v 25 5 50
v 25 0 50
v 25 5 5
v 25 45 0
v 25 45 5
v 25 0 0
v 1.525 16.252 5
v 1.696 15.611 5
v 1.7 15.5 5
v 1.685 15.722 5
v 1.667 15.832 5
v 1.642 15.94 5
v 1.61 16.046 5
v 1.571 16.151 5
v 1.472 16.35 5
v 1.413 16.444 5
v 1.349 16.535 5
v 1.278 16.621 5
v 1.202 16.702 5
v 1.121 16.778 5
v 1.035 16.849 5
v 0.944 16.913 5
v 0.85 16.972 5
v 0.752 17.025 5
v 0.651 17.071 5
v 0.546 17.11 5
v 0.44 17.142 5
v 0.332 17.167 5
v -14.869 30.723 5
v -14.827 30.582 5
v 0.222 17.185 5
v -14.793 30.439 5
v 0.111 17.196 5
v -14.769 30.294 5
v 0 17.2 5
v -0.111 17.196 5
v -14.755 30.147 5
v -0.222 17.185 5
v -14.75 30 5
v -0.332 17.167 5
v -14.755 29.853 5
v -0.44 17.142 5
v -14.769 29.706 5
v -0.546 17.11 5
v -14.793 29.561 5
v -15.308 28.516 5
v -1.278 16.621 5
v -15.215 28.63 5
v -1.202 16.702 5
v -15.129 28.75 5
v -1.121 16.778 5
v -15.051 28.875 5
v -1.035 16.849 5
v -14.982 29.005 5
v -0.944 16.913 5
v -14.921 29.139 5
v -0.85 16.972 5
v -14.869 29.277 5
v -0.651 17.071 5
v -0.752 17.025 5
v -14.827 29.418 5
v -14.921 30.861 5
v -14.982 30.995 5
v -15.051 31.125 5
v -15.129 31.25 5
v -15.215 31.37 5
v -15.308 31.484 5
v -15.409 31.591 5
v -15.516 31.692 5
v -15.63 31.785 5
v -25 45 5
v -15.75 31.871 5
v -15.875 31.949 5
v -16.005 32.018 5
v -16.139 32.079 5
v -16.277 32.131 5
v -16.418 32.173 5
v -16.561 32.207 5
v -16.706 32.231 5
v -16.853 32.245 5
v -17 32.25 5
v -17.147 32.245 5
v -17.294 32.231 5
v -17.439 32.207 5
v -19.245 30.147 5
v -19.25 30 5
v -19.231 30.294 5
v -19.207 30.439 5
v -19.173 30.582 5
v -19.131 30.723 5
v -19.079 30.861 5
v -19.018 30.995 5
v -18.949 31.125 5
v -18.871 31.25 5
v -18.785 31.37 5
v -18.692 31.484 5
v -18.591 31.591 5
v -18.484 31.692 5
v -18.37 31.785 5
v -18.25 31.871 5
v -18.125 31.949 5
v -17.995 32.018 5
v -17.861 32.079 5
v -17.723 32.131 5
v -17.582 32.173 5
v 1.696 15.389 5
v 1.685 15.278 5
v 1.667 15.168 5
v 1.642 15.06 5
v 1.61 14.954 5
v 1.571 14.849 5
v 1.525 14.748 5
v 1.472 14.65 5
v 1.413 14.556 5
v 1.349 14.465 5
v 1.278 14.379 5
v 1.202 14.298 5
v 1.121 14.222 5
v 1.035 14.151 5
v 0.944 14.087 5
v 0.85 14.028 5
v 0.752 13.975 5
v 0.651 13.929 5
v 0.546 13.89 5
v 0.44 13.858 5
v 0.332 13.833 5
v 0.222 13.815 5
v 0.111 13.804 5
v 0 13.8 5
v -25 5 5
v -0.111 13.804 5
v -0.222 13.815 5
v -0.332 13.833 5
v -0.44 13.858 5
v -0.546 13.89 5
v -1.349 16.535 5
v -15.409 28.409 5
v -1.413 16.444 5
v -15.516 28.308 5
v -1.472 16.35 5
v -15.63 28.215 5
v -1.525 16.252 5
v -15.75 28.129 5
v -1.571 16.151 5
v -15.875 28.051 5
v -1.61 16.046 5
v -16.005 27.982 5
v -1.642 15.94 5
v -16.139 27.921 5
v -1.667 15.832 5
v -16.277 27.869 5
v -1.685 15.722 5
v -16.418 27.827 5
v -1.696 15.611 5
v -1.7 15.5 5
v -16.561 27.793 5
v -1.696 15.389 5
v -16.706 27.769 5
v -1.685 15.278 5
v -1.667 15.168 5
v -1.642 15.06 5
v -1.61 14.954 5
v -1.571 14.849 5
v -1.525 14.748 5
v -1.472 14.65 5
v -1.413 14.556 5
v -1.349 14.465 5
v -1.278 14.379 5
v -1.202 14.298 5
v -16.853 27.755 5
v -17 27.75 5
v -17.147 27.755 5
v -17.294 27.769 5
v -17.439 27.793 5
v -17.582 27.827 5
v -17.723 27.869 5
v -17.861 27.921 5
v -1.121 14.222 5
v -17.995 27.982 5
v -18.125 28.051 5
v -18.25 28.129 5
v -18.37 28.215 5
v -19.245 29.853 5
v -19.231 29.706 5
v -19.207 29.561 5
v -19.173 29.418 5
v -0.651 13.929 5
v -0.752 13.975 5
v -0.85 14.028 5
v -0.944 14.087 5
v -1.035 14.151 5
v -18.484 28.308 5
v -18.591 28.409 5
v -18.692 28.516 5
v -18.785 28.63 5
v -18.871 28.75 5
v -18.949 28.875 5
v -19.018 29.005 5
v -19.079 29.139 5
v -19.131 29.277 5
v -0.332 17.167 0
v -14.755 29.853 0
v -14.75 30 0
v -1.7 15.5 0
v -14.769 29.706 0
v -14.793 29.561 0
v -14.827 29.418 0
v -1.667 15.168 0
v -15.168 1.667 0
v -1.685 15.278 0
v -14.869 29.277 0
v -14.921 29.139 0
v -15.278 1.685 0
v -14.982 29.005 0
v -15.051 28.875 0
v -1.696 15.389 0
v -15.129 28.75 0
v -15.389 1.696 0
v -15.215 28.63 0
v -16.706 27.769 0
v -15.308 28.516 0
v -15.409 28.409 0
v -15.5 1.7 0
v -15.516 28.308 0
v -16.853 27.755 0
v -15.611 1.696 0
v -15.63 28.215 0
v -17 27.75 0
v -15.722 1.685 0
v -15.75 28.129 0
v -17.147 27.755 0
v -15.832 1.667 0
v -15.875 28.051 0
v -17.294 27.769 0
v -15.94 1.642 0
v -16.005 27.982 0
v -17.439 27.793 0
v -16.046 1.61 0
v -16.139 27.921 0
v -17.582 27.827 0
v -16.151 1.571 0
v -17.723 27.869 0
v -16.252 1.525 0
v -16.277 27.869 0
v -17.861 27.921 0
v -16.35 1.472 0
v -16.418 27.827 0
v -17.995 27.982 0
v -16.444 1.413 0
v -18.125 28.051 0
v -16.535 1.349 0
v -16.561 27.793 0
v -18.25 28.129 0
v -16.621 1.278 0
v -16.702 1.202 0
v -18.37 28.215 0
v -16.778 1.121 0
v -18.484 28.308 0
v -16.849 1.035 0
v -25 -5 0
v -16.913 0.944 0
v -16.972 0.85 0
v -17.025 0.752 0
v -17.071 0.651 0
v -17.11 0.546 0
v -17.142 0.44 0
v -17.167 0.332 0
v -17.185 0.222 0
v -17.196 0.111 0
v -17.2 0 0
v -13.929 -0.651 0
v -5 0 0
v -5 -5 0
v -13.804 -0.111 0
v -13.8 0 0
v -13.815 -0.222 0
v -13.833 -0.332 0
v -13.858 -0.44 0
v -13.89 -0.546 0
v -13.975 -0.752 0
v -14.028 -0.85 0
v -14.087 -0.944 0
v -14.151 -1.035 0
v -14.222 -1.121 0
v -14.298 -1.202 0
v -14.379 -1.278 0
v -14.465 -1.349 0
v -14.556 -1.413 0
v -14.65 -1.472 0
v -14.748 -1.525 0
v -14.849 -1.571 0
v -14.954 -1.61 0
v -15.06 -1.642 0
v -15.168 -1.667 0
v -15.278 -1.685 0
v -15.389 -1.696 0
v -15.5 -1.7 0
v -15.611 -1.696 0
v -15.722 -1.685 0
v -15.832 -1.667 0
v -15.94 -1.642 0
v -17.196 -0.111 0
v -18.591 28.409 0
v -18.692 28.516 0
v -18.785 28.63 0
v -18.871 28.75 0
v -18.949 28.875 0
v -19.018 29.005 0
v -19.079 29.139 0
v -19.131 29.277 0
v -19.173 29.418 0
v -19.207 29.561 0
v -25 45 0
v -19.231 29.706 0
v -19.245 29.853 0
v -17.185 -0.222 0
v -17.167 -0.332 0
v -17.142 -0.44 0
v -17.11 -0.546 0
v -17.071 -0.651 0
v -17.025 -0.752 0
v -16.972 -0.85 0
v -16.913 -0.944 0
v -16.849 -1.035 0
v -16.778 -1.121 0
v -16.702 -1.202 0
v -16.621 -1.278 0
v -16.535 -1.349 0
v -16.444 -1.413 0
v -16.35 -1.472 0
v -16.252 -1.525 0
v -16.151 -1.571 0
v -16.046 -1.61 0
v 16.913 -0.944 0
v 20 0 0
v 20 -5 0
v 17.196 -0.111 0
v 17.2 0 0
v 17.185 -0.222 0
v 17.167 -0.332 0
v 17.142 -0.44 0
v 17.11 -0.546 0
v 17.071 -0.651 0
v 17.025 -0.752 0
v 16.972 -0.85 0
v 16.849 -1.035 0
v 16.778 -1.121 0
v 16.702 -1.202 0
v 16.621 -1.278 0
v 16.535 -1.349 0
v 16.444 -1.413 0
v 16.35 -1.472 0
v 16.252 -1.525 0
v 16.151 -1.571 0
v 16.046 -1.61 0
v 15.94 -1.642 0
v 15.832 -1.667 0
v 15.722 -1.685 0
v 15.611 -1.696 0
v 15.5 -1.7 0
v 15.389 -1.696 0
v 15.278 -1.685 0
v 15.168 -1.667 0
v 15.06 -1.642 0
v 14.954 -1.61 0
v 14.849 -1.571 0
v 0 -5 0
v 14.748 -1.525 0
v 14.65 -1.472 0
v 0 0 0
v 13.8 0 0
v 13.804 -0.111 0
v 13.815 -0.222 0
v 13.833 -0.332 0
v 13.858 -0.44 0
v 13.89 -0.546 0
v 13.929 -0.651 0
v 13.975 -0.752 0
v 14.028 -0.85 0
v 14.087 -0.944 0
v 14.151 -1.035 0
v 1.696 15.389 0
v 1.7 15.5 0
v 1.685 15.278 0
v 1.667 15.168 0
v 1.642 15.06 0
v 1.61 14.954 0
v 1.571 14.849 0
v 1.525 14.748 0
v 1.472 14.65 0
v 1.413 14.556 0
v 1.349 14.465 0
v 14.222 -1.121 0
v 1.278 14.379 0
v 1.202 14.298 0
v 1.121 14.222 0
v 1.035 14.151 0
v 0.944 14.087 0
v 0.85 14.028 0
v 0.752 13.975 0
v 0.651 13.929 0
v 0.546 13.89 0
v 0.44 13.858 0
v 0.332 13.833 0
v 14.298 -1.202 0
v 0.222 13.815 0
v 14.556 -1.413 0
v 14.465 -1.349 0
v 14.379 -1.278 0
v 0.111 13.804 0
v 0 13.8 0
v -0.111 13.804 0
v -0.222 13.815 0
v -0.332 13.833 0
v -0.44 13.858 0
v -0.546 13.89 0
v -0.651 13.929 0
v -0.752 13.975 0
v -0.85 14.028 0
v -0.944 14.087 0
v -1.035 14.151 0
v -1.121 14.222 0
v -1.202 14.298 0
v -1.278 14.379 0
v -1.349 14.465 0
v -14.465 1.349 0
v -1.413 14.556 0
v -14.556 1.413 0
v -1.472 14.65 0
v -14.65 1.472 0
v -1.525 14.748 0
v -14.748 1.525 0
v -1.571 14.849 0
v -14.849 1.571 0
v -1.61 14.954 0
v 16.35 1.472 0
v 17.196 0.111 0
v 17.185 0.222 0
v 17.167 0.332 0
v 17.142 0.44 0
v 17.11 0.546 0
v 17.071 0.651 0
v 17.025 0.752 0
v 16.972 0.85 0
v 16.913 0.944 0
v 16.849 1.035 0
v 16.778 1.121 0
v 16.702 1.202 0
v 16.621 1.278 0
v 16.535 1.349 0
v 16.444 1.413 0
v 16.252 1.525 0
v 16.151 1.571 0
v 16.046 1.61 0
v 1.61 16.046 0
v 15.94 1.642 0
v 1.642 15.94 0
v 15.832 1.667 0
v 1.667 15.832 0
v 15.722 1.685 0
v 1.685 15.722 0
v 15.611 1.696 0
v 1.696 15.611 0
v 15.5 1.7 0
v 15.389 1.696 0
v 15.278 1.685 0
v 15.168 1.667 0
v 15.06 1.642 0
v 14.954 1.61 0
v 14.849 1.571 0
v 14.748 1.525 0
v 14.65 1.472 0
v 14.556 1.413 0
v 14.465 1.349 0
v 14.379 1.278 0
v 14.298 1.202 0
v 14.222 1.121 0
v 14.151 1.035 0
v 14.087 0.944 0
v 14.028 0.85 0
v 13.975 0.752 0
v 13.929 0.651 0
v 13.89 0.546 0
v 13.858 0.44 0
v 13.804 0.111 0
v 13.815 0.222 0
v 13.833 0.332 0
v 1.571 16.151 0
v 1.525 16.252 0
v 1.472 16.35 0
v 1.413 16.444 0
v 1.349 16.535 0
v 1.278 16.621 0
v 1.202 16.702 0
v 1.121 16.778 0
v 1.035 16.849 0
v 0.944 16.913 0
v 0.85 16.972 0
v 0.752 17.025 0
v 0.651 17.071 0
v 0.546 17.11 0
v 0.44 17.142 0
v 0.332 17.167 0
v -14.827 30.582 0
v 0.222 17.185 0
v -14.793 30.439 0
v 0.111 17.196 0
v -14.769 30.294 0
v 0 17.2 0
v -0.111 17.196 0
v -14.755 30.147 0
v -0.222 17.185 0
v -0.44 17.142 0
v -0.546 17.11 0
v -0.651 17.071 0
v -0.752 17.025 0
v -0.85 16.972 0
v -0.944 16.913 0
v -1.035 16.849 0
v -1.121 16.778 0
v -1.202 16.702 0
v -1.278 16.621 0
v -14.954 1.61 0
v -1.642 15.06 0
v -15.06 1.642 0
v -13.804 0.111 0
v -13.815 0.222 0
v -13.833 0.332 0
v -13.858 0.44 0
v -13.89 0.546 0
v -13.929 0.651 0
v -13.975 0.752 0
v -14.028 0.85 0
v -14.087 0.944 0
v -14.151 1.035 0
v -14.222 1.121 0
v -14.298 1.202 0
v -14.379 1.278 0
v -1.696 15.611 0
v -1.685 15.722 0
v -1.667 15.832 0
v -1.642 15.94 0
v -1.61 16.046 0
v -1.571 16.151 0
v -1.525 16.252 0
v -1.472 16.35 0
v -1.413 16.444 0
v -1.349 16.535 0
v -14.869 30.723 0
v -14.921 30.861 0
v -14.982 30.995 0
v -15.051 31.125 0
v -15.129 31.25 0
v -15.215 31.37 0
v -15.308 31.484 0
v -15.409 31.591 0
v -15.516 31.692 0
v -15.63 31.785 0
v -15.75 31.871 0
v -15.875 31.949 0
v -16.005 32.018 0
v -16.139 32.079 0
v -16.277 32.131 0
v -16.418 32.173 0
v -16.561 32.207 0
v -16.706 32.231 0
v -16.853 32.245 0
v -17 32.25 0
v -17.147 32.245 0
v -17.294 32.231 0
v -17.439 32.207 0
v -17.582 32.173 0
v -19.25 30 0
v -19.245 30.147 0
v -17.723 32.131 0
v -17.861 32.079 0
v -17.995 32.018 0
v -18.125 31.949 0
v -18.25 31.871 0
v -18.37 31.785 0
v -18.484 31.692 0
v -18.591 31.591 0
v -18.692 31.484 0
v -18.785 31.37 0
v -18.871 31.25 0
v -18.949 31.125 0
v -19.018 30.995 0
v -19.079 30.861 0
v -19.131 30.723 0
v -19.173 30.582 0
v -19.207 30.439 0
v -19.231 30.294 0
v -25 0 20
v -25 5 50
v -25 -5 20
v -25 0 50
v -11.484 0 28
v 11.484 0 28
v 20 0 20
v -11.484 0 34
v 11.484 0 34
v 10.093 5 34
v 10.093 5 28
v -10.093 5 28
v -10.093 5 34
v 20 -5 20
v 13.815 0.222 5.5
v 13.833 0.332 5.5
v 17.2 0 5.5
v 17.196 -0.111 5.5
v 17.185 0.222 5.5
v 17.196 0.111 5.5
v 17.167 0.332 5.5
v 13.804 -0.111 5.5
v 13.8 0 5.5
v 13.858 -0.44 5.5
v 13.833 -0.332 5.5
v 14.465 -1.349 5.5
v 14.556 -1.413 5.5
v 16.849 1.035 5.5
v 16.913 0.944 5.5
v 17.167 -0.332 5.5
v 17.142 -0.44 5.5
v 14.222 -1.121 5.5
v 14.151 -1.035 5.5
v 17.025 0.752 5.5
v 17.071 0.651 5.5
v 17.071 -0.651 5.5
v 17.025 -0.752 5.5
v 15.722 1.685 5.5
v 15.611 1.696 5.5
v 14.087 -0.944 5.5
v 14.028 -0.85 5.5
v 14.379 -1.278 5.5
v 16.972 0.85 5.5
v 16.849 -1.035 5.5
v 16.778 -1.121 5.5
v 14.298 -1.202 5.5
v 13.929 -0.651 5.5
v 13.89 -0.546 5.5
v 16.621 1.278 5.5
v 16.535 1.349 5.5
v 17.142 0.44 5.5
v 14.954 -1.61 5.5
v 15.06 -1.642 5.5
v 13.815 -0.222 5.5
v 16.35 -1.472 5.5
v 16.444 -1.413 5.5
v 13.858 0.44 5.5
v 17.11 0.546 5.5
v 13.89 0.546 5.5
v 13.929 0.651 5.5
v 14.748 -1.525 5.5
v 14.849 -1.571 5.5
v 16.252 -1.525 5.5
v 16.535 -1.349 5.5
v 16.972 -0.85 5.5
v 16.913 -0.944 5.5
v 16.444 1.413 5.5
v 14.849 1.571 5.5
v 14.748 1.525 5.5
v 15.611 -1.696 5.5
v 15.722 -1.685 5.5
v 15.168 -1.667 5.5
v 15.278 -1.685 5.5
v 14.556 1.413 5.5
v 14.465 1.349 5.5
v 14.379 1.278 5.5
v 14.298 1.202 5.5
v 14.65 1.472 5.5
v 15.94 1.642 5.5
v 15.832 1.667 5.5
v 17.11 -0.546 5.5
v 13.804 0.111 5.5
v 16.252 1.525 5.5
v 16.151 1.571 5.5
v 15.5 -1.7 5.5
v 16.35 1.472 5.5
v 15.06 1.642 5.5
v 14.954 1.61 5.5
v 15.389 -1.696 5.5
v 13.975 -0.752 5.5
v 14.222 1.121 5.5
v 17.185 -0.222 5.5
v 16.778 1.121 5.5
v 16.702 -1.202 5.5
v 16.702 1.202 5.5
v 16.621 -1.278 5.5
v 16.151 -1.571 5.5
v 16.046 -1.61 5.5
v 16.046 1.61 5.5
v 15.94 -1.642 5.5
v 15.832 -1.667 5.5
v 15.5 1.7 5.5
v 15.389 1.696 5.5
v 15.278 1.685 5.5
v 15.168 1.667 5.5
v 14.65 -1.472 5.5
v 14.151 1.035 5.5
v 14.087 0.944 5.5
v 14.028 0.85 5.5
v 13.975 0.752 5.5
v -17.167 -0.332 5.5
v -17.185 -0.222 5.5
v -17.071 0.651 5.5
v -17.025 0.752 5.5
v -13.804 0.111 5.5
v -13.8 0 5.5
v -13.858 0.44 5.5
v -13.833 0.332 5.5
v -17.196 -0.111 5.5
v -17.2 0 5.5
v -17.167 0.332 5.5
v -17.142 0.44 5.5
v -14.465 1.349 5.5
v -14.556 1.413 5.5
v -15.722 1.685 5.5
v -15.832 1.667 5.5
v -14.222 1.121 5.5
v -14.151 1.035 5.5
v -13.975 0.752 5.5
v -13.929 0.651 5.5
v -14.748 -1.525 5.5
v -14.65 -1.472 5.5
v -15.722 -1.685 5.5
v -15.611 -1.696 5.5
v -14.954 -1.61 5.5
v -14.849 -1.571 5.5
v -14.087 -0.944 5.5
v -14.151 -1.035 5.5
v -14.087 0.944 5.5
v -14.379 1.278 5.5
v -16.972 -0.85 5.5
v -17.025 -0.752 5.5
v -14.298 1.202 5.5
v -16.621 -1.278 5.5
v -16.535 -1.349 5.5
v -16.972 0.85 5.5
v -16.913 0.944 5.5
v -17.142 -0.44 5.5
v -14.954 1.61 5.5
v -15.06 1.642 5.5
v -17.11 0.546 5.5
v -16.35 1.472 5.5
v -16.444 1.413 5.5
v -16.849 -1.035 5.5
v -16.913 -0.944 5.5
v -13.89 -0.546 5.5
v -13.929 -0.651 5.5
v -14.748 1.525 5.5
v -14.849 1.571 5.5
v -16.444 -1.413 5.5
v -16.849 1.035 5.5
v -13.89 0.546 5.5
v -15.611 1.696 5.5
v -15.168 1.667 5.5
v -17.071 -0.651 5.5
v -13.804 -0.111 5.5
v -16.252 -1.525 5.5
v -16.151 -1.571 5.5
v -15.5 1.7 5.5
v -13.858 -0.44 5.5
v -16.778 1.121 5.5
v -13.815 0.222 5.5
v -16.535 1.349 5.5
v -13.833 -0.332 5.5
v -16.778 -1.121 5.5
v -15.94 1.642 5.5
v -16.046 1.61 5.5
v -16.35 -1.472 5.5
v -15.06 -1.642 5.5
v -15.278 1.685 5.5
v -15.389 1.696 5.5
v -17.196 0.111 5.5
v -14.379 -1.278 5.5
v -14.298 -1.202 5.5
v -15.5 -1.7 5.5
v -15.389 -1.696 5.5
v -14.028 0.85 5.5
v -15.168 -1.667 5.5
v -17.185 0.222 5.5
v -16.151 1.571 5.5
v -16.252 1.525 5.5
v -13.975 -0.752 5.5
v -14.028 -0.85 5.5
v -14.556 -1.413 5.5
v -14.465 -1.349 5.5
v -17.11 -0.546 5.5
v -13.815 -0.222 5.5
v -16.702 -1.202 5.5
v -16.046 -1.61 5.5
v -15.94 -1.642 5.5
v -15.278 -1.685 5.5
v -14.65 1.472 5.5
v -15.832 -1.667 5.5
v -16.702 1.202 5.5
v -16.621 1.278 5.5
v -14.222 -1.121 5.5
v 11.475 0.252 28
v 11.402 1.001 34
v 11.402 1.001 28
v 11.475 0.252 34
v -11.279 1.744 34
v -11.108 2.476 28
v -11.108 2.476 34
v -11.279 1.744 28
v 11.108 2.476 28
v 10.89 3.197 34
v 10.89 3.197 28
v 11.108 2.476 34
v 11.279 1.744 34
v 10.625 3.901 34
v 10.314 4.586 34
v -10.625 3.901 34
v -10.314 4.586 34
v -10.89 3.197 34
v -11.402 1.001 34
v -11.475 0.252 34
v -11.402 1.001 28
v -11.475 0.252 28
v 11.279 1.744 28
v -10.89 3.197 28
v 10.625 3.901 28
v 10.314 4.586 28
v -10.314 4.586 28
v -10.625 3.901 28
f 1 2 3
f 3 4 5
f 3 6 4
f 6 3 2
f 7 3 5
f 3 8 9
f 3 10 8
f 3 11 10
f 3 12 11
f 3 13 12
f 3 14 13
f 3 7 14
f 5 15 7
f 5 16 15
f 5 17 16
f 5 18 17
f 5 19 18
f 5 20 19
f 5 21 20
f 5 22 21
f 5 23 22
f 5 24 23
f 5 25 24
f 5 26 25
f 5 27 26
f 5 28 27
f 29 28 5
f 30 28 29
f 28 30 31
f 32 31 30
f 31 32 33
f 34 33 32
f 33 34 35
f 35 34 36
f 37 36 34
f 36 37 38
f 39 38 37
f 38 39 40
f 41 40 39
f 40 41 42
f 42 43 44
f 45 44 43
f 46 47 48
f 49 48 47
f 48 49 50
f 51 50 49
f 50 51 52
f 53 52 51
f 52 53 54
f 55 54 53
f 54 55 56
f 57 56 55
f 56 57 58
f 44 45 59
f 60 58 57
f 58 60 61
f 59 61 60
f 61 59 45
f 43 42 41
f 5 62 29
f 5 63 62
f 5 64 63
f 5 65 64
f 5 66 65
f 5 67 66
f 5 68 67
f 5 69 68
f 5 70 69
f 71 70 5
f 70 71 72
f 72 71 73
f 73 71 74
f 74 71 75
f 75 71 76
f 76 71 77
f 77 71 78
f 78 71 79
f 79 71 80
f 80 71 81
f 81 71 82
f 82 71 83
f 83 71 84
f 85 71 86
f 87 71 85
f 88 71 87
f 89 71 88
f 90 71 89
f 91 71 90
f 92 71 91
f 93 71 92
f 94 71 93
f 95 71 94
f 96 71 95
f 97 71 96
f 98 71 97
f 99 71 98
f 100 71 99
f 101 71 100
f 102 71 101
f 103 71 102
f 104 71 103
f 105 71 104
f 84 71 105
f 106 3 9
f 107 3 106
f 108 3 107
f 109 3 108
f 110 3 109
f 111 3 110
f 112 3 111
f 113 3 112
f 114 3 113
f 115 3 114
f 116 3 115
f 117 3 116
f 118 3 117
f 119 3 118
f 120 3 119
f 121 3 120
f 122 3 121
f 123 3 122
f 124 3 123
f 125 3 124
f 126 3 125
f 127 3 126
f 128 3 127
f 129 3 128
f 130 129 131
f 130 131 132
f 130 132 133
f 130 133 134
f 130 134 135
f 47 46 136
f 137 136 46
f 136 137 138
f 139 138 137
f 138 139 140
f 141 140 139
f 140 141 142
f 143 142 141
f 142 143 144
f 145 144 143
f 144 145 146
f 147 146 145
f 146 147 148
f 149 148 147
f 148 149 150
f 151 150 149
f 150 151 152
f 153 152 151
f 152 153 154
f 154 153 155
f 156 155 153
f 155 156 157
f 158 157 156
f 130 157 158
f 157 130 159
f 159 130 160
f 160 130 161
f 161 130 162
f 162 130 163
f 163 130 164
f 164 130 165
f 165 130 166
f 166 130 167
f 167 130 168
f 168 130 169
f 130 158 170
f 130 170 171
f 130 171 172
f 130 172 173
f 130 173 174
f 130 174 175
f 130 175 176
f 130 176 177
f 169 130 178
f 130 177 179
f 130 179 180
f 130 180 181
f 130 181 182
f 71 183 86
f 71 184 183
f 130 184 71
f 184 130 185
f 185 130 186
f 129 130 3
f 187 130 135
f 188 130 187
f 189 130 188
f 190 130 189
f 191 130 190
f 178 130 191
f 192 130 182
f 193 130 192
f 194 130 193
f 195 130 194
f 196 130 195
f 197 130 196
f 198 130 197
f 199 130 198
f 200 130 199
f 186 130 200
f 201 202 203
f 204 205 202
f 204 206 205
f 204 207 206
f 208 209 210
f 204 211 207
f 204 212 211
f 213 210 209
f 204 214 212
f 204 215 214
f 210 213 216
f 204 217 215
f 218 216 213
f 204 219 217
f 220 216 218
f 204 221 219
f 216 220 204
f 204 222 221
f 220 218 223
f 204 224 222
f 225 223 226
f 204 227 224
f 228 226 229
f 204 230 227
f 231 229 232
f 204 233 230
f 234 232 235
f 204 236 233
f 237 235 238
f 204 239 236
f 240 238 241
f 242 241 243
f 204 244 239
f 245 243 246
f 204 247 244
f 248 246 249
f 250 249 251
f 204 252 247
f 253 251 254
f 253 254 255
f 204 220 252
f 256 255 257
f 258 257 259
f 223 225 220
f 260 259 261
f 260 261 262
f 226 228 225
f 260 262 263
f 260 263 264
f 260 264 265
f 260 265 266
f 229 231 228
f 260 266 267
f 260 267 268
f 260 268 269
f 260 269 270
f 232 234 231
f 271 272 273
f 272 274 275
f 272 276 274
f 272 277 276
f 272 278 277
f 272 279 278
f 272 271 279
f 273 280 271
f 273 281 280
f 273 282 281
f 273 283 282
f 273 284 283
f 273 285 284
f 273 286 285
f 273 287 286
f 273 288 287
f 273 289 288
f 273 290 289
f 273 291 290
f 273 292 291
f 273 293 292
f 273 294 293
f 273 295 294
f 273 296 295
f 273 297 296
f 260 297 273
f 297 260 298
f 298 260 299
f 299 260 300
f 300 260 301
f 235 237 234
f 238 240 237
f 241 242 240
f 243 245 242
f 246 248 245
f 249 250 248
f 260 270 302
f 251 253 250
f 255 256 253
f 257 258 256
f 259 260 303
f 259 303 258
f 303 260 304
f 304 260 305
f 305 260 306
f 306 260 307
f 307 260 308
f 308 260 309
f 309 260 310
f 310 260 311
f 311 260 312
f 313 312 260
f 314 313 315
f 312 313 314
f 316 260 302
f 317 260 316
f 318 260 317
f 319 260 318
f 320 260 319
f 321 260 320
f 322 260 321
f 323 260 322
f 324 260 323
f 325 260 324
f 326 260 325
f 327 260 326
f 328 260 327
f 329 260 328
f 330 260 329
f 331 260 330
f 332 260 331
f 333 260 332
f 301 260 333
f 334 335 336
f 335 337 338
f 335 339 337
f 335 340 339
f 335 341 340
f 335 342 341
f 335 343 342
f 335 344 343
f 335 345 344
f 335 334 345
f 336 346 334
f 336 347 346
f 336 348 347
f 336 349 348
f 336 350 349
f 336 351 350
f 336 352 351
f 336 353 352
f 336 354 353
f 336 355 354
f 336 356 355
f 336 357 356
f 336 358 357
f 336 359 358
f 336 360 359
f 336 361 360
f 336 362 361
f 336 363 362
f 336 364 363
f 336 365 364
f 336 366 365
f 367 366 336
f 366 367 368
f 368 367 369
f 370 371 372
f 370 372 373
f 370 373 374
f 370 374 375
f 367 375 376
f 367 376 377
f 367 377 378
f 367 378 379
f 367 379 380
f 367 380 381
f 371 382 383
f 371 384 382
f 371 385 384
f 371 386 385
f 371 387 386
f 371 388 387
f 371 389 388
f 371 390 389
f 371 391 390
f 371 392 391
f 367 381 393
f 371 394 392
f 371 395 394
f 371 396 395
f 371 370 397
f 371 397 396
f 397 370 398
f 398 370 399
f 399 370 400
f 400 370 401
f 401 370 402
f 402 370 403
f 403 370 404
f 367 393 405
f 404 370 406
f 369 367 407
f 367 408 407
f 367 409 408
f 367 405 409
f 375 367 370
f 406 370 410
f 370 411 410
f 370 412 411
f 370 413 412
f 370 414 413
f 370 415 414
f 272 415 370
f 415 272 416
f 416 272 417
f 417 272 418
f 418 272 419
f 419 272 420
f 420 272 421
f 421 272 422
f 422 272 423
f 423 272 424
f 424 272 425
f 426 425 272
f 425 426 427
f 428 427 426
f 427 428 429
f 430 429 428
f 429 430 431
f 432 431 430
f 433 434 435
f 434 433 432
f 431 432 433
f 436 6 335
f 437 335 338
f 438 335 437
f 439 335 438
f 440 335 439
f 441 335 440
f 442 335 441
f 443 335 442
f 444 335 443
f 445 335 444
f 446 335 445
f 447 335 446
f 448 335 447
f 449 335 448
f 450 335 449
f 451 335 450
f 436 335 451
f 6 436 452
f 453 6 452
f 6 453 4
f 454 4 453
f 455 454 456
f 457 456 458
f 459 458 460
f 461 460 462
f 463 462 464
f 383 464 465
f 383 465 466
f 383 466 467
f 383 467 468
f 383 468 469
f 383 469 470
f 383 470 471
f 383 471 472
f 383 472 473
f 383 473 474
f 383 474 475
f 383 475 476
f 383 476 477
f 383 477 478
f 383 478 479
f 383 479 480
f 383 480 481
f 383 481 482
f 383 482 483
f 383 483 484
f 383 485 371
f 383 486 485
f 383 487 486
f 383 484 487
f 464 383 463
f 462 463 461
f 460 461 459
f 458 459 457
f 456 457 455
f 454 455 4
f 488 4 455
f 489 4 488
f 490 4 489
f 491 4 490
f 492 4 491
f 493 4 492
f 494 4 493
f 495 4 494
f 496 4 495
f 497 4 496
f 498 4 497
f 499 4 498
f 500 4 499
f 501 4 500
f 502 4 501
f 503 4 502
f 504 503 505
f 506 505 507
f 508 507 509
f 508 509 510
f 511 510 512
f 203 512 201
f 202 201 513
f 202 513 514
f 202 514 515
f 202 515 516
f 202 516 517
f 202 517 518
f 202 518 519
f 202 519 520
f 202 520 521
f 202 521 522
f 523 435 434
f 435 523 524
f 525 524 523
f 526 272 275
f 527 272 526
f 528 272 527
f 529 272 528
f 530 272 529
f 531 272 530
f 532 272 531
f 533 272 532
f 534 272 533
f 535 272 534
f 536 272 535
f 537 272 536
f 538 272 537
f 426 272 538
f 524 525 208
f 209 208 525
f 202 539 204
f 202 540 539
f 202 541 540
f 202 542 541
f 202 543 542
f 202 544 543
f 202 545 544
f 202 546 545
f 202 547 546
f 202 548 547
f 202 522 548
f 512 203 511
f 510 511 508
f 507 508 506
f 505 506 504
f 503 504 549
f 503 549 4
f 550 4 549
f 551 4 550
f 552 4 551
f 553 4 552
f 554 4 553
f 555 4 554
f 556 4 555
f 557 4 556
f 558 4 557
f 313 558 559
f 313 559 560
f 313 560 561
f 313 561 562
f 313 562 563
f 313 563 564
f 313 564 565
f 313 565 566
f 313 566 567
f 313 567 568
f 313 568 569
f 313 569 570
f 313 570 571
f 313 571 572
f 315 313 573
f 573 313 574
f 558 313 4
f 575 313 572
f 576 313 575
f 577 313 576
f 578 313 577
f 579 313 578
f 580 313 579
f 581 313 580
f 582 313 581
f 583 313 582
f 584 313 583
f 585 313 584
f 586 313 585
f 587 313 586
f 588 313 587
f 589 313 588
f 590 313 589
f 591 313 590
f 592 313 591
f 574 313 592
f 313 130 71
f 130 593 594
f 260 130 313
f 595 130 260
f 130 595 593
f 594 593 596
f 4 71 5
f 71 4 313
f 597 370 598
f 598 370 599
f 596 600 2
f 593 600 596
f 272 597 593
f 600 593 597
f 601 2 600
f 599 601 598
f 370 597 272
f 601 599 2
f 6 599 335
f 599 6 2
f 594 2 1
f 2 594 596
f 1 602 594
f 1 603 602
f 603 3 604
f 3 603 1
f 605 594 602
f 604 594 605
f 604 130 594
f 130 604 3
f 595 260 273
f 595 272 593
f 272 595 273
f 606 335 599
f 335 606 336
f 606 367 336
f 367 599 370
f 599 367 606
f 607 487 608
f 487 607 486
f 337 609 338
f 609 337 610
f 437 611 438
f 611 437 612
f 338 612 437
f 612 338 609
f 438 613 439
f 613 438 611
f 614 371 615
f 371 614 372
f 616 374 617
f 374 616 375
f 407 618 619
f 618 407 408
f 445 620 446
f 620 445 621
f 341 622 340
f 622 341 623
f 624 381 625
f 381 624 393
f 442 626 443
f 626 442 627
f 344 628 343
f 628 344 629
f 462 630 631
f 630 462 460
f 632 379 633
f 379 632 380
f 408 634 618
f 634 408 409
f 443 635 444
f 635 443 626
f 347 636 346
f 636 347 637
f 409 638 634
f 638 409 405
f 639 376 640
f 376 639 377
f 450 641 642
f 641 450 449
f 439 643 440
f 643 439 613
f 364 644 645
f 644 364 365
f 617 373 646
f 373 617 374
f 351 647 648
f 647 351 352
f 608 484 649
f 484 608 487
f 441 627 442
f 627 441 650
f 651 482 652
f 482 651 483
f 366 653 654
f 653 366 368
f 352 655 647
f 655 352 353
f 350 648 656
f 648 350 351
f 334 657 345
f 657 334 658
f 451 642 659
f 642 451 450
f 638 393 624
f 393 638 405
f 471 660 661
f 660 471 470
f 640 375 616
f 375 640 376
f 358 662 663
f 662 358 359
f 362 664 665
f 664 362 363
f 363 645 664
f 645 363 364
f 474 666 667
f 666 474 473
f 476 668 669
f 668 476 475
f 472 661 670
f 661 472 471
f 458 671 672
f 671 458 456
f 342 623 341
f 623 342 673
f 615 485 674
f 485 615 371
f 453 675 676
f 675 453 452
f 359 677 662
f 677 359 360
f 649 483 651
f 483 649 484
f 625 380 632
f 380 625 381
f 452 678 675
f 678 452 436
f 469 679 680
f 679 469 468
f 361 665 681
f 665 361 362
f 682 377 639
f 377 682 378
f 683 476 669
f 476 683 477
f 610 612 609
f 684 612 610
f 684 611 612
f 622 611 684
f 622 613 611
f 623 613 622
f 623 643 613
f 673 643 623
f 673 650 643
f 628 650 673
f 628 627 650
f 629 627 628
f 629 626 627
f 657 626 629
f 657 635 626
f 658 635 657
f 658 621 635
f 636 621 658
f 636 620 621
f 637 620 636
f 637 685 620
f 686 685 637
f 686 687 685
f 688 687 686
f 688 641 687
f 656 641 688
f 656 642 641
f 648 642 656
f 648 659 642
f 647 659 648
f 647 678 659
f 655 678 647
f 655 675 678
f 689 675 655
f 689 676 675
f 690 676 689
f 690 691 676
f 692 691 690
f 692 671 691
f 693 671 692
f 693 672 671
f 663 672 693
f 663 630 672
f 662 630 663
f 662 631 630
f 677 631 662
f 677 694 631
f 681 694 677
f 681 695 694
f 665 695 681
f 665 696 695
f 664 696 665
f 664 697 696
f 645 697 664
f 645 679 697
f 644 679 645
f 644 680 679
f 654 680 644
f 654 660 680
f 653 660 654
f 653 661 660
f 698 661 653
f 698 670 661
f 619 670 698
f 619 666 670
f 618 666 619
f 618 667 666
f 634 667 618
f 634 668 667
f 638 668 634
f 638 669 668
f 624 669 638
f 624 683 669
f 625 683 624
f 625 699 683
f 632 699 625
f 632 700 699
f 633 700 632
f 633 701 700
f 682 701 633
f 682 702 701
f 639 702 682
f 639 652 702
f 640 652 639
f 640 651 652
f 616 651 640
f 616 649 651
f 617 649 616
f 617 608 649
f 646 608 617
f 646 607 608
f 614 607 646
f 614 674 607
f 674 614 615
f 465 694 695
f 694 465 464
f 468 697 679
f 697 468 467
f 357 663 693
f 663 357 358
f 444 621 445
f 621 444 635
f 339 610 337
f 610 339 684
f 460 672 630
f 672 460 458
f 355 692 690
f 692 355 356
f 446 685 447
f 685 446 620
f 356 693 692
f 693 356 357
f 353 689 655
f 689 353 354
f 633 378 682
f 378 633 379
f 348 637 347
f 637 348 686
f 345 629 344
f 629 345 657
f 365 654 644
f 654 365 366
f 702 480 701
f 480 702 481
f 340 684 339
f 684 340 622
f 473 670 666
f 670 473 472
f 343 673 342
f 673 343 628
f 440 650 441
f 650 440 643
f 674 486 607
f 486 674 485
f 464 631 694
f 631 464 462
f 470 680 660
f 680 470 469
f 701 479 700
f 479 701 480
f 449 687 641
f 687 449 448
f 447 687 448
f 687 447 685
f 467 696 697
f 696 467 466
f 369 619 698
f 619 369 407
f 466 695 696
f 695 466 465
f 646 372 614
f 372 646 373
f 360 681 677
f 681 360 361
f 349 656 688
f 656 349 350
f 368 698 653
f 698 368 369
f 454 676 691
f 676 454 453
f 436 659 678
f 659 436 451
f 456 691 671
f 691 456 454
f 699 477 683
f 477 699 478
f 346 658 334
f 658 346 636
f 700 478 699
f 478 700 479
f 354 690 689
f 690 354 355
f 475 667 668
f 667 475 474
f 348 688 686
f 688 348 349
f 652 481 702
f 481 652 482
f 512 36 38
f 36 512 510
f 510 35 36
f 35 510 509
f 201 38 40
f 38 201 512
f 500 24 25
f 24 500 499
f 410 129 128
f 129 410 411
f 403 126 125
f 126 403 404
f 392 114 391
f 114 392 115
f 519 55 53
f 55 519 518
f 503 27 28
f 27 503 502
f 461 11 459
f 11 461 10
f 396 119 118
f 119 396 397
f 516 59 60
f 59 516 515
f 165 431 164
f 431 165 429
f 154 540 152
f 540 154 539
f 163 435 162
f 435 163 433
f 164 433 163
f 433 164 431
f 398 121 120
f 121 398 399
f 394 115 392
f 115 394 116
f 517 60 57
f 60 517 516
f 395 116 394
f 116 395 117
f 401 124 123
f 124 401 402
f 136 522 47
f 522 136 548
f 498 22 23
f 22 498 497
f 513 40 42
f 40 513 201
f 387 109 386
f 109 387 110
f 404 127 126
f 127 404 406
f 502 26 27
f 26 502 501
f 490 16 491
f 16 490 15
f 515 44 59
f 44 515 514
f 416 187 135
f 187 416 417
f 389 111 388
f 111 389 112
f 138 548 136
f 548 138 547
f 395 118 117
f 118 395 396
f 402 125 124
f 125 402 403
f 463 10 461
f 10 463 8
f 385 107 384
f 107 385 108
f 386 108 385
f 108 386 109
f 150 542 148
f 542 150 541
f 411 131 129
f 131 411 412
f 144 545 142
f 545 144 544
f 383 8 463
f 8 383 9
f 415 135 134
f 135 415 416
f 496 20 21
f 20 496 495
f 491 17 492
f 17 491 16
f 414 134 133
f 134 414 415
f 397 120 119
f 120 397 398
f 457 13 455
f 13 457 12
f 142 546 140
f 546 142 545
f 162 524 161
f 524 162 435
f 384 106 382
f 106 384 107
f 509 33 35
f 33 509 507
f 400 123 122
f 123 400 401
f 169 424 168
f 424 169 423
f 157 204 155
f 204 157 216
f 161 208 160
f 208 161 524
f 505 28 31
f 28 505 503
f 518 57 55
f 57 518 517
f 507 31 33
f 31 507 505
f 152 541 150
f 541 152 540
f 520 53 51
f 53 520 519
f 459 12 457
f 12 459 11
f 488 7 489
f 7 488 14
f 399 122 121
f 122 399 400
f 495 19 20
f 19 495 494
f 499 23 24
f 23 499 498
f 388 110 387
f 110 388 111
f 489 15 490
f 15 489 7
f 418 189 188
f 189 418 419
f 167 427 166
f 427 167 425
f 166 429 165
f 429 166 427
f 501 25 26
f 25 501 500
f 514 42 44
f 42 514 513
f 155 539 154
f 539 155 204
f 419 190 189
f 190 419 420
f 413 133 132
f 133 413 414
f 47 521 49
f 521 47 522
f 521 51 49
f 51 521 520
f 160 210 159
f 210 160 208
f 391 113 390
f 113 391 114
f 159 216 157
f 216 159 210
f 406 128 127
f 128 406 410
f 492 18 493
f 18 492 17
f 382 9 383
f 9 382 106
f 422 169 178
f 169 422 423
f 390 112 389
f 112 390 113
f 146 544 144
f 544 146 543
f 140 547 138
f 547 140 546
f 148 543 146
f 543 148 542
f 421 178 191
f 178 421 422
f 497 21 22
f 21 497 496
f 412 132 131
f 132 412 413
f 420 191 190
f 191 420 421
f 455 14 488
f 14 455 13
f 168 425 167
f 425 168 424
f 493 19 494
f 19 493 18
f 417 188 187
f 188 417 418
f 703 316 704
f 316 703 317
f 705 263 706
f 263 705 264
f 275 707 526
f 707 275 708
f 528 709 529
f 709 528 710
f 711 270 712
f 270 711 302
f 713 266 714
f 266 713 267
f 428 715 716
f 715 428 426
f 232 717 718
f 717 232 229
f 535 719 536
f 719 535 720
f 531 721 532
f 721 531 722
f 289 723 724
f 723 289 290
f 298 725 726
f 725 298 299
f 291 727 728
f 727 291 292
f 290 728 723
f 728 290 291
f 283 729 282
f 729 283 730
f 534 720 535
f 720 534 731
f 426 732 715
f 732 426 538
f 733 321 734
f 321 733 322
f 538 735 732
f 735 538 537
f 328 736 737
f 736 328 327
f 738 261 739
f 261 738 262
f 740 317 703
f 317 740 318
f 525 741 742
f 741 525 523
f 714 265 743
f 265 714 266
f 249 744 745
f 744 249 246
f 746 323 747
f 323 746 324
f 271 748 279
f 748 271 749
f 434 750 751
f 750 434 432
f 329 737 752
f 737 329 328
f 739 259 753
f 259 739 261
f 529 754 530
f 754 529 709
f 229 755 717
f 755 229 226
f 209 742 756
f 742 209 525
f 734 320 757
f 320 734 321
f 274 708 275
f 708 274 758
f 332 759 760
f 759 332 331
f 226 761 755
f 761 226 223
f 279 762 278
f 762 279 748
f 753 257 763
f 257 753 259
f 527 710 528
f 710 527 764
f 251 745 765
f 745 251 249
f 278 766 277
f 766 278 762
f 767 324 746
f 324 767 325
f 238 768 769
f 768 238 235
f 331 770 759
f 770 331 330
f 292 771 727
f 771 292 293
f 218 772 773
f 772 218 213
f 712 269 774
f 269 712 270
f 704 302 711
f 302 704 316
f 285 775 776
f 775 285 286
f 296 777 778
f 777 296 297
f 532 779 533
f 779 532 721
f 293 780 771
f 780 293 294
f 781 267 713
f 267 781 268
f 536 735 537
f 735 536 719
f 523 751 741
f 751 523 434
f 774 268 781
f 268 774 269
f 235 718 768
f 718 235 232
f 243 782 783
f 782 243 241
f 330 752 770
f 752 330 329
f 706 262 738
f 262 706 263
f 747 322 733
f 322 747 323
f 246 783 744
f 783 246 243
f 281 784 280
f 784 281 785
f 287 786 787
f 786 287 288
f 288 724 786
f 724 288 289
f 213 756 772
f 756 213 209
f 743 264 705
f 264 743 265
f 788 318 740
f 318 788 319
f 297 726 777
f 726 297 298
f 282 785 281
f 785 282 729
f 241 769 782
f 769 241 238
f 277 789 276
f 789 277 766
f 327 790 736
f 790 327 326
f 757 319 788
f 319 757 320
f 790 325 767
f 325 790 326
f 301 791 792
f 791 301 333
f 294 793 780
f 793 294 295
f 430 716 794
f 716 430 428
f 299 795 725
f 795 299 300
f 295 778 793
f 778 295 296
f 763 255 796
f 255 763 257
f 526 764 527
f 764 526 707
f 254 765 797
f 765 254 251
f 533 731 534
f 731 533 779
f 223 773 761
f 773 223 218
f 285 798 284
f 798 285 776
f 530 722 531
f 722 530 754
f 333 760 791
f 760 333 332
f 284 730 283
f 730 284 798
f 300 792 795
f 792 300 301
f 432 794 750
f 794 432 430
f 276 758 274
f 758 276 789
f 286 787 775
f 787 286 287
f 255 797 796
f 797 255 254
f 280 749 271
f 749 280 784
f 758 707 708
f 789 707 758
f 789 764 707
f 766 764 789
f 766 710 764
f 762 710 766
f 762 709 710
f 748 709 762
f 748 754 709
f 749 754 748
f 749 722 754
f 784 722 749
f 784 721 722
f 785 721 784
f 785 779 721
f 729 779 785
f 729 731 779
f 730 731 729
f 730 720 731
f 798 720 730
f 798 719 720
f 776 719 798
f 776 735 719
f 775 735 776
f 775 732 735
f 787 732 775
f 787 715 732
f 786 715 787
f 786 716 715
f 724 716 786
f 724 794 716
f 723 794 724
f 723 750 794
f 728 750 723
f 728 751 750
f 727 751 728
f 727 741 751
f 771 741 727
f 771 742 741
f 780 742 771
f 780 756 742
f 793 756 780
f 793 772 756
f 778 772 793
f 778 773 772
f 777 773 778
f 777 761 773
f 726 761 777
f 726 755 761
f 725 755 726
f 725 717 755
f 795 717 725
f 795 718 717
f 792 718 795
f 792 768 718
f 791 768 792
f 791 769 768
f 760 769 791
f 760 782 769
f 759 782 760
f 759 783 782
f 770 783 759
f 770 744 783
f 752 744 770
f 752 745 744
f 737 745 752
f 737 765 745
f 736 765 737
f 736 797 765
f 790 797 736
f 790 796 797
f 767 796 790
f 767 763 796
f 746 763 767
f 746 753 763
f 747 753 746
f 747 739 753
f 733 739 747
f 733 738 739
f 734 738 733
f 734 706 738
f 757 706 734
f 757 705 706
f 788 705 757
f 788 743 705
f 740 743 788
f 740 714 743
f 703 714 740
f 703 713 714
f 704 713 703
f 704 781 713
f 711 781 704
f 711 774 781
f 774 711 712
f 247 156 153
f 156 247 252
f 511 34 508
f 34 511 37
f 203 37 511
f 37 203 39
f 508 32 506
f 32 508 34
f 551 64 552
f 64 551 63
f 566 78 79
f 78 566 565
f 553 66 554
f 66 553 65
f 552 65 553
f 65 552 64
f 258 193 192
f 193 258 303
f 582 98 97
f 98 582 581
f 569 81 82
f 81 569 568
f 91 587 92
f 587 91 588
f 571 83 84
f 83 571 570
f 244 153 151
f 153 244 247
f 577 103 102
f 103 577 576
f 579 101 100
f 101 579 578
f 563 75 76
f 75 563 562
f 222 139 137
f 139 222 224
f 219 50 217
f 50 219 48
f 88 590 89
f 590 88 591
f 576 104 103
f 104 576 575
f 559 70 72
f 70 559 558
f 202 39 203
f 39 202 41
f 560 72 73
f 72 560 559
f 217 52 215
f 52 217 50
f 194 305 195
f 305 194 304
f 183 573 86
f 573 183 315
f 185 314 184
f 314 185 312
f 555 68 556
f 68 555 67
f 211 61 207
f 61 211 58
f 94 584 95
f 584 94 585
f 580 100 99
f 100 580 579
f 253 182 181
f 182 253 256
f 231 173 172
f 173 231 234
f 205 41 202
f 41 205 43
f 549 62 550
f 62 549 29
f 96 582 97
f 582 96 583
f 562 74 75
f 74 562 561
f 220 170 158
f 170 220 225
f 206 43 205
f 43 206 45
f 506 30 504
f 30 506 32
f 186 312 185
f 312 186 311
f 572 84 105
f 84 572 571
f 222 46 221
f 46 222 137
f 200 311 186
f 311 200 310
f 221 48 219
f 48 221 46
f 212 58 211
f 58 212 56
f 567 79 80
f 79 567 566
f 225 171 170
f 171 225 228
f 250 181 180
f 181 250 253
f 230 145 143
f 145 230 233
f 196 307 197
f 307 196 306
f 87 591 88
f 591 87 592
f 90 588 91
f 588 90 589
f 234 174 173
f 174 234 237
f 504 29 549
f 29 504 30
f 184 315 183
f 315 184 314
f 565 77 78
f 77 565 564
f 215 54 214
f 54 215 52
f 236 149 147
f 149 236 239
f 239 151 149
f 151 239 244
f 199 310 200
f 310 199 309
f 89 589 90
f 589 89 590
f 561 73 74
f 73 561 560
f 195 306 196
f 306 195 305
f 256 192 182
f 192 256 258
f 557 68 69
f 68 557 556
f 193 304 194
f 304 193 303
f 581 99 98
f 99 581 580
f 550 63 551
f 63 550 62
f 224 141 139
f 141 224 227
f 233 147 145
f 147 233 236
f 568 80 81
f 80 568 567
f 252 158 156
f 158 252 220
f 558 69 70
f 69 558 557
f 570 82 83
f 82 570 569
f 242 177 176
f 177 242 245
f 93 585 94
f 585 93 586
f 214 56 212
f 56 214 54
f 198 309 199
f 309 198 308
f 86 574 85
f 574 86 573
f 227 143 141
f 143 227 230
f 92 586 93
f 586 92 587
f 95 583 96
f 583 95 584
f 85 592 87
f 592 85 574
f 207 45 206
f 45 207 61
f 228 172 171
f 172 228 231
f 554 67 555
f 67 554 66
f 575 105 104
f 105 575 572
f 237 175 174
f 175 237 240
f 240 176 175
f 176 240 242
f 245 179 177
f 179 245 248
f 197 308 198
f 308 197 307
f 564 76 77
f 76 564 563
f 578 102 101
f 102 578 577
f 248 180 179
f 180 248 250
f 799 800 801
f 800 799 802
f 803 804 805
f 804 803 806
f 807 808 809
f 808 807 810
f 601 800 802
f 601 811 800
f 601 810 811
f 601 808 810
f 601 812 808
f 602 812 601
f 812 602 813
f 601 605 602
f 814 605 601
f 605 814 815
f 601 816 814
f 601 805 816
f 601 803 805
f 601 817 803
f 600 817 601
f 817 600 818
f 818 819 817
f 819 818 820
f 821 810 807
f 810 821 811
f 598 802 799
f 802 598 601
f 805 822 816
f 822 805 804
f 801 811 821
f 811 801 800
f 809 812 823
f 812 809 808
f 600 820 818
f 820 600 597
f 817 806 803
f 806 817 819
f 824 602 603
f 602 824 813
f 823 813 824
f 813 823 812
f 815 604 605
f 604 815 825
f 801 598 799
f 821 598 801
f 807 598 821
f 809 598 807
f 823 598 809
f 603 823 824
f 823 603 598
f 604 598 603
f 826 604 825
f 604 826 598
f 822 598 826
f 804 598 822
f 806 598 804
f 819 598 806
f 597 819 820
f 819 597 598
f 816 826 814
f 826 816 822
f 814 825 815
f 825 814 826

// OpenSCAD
// L-shaped mounting bracket for NEMA 17 stepper motor
// Print orientation: base plate on bed (z = 0), motor plate builds upward (+Z)

// ---------------- Parameters ----------------
base_x0      = -25;    // base plate: x start
base_x1      = 25;     // base plate: x end
base_y0      = 0;      // base plate: y start
base_y1      = 45;     // base plate: y end
base_z0      = 0;      // base plate: z start
base_z1      = 5;      // base plate: z end

hole_x       = -17;    // M4 through-hole x position
hole_y       = 30;     // M4 through-hole y position
hole_d       = 4.5;    // M4 hole diameter

plate_x0     = -25;    // motor plate: x start
plate_x1     = 25;     // motor plate: x end
plate_y0     = 0;      // motor plate: y start
plate_y1     = 5;      // motor plate: y end (thickness)
plate_z0     = 0;      // motor plate: z start
plate_z1     = 50;     // motor plate: z end

boss_d       = 23;     // motor centring boss hole diameter
boss_x       = 0;      // boss hole centre x
boss_z       = 28;     // boss hole centre z

screw_d      = 3.4;    // M3 screw hole diameter
screw_p      = 31;     // square pattern pitch (centre to centre)

gusset_t     = 5;      // gusset thickness (X)
gusset_leg   = 20;     // right triangle leg length (Y and Z)
gusset_x0    = -25;    // left gusset x start
gusset_x1    = 20;     // right gusset x end

eps          = 0.5;    // cutter overshoot past faces

$fn = 96;

// ---------------- Model ----------------
difference() {
    union() {
        // Base plate
        translate([base_x0, base_y0, base_z0])
            cube([base_x1 - base_x0, base_y1 - base_y0, base_z1 - base_z0]);

        // Vertical motor plate
        translate([plate_x0, plate_y0, plate_z0])
            cube([plate_x1 - plate_x0, plate_y1 - plate_y0, plate_z1 - plate_z0]);

        // Left triangular gusset (flush with left edge)
        translate([gusset_x0, 0, 0])
            rotate([90, 0, 0])
                linear_extrude(height = gusset_t)
                    polygon(points = [
                        [0, 0],
                        [gusset_leg, 0],
                        [0, gusset_leg]
                    ]);

        // Right triangular gusset (flush with right edge)
        translate([gusset_x1, 0, 0])
            rotate([90, 0, 0])
                linear_extrude(height = gusset_t)
                    polygon(points = [
                        [0, 0],
                        [-gusset_leg, 0],
                        [0, gusset_leg]
                    ]);
    }

    // M4 through-holes in base plate
    translate([hole_x, hole_y, -eps])
        cylinder(d = hole_d, h = base_z1 - base_z0 + 2 * eps);

    // Motor boss hole through vertical plate (along Y)
    translate([boss_x, plate_y0 - eps, boss_z])
        cylinder(d = boss_d, h = plate_y1 - plate_y0 + 2 * eps);

    // M3 screw holes on 31 mm square pattern, centred on boss hole
    for (a = [0, 90, 180, 270])
        rotate([0, 0, a])
            translate([screw_p / 2, 0, 0])
                cylinder(d = screw_d, h = plate_y1 - plate_y0 + eps);
}
